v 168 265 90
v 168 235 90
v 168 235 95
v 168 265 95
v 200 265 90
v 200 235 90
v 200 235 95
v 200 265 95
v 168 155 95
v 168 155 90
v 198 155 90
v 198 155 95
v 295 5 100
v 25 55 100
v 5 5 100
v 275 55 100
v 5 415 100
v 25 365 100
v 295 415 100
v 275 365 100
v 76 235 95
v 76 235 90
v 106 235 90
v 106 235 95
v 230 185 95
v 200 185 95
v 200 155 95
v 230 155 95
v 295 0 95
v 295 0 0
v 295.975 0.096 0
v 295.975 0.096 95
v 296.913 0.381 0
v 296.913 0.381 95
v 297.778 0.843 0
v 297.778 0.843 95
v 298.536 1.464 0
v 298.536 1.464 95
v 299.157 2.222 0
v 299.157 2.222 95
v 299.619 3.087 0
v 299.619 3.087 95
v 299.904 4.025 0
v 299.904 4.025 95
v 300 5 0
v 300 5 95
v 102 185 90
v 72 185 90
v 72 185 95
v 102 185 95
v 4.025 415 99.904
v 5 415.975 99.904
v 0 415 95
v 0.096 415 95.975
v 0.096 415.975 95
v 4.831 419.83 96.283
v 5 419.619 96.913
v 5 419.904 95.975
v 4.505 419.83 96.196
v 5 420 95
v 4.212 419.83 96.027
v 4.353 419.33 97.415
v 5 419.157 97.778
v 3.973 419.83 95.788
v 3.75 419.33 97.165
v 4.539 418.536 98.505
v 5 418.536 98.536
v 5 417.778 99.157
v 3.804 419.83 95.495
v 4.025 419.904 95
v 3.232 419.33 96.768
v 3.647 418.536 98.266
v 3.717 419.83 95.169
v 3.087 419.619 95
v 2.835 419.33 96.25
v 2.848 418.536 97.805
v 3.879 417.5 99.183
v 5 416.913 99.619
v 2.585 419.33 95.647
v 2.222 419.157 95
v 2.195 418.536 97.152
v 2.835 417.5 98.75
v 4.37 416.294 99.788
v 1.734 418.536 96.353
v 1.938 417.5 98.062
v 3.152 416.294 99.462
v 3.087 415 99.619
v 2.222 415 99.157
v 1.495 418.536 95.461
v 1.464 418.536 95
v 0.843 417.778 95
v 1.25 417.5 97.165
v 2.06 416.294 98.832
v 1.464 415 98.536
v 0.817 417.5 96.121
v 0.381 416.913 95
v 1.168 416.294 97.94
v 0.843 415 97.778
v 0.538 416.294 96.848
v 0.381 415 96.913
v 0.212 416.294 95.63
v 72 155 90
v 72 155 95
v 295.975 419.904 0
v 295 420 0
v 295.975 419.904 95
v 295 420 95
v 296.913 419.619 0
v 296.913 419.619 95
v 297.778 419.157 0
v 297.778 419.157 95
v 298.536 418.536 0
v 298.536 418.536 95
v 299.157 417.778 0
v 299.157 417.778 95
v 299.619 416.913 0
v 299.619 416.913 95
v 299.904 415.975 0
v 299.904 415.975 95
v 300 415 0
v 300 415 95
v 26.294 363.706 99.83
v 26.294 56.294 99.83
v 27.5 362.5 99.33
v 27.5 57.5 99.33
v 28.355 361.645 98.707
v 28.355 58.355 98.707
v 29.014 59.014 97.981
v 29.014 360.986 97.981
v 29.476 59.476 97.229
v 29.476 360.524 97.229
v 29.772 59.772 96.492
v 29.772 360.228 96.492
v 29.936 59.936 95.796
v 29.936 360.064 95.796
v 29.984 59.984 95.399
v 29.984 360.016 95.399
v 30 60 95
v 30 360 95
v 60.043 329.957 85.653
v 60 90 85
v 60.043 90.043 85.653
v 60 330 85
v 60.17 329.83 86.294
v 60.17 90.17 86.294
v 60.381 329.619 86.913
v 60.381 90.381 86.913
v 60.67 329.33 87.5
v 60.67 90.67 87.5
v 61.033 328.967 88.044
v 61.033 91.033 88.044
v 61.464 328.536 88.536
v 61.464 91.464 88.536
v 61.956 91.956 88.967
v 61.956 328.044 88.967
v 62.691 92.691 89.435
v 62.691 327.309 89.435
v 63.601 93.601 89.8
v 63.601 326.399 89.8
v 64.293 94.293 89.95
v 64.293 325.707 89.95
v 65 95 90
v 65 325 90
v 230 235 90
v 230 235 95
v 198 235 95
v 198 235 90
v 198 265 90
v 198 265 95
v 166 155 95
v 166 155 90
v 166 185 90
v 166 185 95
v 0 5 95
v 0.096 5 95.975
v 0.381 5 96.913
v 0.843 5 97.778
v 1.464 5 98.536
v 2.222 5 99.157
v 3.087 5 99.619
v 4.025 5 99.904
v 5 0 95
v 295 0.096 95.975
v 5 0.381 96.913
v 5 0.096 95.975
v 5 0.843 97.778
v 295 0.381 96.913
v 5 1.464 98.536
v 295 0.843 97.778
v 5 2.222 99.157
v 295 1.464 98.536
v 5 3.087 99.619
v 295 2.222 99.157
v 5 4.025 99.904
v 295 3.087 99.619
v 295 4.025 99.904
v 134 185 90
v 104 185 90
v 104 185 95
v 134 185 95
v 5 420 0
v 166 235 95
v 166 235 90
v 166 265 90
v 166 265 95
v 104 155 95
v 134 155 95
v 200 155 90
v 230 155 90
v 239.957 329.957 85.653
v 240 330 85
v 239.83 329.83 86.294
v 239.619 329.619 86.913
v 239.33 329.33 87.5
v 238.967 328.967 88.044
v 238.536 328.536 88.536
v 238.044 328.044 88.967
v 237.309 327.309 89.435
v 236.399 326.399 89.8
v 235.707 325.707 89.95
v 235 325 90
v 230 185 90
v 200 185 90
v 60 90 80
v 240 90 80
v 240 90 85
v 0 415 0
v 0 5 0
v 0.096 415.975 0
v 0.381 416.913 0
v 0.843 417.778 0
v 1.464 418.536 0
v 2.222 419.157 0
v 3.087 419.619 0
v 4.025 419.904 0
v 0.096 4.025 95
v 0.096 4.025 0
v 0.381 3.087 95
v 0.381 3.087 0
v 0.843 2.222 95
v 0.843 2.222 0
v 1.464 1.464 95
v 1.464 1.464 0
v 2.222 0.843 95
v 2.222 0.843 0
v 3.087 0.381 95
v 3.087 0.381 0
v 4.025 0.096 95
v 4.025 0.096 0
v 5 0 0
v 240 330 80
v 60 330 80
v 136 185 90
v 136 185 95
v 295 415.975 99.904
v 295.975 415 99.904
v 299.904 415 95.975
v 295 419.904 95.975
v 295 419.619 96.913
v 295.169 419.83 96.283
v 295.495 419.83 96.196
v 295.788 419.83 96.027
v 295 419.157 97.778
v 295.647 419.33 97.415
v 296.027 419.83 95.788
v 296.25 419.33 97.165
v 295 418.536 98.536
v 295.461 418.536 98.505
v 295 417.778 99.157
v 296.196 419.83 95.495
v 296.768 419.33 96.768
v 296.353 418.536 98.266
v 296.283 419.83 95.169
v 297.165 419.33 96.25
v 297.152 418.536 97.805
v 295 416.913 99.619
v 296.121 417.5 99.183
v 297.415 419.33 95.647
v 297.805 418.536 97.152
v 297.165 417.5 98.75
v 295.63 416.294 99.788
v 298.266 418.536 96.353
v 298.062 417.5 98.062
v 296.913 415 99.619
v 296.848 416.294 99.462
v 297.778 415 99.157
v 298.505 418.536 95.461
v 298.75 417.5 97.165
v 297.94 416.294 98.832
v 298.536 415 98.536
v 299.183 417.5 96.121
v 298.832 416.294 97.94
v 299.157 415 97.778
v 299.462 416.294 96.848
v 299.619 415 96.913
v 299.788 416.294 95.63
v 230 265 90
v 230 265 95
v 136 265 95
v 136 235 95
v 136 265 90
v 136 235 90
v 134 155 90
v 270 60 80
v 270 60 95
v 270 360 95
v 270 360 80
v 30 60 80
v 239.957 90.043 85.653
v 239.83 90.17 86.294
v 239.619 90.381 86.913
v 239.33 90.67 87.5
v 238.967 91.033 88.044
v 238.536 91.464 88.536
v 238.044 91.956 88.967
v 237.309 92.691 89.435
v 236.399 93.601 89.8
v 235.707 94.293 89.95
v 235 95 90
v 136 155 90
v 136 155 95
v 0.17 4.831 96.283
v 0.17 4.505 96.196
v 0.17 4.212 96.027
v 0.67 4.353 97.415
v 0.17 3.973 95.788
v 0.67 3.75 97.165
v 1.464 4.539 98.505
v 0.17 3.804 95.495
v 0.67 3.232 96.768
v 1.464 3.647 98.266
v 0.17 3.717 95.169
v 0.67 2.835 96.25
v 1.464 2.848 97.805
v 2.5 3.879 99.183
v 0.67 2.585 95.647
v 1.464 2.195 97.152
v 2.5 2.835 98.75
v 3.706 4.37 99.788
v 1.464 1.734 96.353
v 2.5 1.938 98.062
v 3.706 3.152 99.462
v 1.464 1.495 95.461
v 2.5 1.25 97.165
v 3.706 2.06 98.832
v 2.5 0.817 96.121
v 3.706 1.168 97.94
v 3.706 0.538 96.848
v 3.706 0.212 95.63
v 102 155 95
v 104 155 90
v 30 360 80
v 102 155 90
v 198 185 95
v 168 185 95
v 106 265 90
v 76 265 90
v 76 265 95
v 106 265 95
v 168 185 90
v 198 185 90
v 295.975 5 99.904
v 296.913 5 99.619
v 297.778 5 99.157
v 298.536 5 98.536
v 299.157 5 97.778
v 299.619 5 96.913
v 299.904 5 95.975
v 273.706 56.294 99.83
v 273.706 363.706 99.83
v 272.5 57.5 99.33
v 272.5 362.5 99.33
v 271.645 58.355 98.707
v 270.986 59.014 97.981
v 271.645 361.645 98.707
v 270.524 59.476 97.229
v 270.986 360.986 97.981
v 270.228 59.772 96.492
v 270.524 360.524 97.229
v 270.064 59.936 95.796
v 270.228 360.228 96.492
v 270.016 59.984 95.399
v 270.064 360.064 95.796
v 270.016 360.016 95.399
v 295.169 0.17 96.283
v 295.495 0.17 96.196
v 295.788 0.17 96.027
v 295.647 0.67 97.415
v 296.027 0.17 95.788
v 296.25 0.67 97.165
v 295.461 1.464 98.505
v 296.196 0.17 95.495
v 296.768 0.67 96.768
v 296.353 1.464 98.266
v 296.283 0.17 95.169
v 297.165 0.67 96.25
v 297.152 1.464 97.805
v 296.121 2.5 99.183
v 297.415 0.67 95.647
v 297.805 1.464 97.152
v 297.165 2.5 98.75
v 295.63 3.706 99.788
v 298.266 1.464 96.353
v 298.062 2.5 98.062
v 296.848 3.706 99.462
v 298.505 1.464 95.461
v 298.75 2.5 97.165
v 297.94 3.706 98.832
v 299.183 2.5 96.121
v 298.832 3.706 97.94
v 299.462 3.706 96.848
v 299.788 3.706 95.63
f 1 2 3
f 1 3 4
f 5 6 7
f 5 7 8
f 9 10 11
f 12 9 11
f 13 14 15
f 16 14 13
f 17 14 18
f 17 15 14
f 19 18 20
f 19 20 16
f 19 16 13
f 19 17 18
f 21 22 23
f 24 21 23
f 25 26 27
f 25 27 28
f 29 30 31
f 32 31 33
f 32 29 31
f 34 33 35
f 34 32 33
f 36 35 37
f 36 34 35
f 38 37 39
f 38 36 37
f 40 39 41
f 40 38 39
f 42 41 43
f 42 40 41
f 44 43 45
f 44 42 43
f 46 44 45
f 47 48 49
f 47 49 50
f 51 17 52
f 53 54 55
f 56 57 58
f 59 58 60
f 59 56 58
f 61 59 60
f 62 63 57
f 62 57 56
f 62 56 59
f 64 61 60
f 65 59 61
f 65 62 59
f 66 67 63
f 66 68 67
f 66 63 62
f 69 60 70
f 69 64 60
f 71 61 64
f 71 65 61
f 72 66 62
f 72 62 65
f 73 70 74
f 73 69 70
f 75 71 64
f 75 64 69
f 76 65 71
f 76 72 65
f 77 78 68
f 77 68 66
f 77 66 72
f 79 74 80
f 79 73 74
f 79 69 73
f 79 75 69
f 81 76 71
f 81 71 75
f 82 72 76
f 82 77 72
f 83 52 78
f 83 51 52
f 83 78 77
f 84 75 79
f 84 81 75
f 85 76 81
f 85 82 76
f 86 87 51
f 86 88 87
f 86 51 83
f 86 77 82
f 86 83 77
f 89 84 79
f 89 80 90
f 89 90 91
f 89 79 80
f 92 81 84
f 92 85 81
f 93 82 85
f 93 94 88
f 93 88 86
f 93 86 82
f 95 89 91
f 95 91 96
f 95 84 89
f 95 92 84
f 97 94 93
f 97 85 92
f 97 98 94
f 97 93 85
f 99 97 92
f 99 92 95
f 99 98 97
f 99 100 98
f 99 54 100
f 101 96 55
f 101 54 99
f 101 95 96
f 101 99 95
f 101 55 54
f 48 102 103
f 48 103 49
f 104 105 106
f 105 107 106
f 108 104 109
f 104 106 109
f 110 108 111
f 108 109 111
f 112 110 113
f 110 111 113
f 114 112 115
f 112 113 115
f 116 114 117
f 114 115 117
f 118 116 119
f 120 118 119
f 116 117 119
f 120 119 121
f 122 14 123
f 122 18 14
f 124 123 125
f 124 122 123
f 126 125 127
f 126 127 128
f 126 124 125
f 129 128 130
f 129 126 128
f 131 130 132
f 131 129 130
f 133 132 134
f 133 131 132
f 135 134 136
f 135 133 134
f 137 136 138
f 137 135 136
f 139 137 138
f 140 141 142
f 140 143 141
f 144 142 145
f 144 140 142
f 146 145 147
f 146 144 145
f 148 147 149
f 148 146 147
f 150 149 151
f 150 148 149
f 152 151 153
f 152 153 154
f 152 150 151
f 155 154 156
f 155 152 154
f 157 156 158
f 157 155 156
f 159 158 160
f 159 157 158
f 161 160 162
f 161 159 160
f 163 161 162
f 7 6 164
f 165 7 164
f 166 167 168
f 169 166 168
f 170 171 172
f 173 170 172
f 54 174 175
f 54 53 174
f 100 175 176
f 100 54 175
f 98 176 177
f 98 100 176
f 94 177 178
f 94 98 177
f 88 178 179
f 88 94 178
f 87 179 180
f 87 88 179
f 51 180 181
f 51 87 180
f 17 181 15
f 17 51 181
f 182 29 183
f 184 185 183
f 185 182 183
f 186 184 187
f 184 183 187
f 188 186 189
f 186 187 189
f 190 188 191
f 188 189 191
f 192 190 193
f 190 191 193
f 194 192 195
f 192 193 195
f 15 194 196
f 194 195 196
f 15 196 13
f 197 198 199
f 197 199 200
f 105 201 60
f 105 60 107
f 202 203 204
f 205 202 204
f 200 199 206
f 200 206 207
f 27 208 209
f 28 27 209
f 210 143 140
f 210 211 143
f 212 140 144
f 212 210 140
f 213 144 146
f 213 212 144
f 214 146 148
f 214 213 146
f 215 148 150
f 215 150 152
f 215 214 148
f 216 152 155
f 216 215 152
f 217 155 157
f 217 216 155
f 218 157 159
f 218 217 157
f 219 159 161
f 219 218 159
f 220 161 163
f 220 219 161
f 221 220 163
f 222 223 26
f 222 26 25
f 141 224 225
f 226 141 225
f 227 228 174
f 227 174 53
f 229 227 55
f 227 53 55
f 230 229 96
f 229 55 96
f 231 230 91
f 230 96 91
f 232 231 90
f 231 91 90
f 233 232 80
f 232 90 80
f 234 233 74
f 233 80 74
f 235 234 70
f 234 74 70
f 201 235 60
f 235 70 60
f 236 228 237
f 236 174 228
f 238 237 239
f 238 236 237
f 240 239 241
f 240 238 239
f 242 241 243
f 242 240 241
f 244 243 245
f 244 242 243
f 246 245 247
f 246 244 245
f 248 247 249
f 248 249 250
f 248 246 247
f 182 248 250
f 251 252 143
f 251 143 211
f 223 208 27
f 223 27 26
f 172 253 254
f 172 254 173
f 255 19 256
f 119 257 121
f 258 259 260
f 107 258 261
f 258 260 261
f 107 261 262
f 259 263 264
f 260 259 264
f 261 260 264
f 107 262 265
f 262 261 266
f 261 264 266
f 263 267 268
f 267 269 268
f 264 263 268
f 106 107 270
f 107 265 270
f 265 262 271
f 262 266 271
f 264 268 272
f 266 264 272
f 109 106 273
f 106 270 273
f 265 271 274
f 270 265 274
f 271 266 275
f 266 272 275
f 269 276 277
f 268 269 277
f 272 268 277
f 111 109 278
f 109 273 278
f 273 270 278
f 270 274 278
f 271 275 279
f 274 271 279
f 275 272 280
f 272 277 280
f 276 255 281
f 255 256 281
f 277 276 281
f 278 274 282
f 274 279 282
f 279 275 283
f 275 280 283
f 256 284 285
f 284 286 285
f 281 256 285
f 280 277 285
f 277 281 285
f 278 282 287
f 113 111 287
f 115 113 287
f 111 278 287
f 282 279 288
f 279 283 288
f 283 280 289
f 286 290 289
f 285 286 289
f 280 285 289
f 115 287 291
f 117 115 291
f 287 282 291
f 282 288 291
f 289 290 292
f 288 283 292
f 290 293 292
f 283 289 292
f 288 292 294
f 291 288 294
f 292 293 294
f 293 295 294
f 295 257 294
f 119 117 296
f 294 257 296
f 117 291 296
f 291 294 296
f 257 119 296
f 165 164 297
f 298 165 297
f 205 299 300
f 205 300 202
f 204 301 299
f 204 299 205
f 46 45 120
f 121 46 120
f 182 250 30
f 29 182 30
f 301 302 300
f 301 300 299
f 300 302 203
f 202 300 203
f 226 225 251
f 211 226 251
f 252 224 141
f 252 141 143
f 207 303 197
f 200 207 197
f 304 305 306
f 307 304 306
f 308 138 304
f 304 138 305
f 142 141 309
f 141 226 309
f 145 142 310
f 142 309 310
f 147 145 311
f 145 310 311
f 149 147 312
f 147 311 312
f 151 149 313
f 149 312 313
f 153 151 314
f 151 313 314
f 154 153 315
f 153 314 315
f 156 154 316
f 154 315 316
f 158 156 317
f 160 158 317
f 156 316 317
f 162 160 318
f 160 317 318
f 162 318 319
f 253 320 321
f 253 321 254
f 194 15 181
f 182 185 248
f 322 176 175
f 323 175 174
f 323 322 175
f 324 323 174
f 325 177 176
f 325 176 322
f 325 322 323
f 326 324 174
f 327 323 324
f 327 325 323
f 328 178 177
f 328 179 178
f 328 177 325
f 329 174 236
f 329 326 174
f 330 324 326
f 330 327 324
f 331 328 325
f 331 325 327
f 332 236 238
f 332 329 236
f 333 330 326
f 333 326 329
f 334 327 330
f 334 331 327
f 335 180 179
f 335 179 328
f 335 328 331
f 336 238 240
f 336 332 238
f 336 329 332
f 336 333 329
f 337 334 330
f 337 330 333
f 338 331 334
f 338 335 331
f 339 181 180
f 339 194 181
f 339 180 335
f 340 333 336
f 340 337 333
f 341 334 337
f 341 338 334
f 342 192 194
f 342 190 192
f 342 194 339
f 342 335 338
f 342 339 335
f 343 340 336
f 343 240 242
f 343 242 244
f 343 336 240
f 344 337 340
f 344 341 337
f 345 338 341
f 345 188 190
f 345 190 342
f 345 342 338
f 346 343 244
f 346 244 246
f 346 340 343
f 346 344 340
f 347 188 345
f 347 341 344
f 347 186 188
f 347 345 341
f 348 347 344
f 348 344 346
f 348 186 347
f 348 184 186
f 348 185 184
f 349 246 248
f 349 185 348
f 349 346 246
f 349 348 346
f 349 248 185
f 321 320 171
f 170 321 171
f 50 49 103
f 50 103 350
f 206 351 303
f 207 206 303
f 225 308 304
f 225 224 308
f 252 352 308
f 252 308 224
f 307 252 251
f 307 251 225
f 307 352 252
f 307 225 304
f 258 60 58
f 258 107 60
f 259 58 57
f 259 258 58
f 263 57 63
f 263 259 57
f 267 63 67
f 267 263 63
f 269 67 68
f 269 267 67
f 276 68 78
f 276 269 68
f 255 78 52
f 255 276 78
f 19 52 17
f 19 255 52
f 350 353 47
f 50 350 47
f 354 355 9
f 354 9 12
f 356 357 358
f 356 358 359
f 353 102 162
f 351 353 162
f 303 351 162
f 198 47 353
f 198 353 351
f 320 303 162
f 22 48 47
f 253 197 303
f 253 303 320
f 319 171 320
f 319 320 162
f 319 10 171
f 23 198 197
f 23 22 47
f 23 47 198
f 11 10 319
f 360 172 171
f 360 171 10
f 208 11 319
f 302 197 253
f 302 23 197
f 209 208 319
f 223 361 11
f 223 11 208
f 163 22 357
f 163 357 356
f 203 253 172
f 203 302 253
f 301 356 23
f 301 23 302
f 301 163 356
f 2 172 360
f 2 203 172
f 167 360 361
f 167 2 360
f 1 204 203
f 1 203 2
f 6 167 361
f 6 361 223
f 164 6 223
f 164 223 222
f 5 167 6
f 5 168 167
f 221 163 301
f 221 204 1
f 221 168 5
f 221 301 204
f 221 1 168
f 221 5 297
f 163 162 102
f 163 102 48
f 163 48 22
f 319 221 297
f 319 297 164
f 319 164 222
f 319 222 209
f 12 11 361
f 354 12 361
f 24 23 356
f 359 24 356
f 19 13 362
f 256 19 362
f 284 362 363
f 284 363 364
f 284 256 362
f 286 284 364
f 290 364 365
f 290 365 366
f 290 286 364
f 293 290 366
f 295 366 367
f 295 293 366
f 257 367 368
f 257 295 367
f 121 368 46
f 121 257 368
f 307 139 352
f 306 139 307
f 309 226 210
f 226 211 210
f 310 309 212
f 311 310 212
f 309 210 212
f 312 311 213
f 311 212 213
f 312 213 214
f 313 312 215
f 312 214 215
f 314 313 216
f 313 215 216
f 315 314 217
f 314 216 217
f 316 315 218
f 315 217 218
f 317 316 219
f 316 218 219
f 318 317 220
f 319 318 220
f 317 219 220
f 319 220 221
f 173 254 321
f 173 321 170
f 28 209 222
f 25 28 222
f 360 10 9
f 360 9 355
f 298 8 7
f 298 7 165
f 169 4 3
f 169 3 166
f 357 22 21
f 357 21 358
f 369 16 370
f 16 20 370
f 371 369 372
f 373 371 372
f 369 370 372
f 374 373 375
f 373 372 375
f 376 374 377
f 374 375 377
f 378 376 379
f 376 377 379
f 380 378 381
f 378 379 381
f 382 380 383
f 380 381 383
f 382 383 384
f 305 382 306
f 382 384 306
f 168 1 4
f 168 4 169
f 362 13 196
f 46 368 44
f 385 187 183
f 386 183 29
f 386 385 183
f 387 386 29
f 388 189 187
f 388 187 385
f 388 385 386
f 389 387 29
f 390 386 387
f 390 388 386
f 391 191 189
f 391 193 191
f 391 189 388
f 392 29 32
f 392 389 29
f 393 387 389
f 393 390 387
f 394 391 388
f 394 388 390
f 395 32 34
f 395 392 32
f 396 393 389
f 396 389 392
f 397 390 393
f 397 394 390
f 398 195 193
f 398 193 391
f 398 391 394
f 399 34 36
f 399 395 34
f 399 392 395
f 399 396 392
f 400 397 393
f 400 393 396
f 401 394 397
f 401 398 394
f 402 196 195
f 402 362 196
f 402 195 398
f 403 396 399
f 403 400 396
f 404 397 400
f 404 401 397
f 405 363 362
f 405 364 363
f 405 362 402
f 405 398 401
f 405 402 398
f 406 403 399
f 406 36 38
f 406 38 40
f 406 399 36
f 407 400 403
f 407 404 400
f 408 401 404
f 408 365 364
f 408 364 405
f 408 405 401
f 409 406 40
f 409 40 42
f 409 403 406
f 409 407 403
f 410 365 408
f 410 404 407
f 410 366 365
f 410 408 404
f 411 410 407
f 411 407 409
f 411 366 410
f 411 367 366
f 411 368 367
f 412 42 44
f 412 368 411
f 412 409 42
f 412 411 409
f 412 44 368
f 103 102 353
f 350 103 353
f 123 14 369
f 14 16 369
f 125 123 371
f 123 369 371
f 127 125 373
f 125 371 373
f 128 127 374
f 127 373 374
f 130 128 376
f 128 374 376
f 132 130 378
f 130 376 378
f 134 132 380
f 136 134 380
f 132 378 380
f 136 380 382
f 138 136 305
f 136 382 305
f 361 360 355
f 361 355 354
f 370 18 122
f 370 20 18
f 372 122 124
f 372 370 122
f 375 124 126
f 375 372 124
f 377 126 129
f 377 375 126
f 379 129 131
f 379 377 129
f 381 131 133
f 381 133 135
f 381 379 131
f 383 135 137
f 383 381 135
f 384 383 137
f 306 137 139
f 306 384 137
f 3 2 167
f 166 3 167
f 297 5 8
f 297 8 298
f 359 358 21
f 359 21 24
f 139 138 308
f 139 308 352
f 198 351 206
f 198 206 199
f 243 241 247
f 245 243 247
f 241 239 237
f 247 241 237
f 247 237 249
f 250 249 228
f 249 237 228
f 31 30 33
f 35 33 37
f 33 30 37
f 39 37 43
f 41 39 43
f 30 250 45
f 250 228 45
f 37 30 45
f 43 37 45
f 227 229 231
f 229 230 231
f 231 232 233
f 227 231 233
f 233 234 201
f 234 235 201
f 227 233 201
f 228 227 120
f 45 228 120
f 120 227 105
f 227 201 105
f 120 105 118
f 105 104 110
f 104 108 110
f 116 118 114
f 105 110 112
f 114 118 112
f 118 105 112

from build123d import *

# Parameters (mm, degrees)
SKETCH1_W           = 300
SKETCH1_H           = 420
BOSS_EXTRUDE1_DEPTH = 100
SKETCH2_W           = 240
SKETCH2_H           = 300
CUT_EXTRUDE1_DEPTH  = 20
SKETCH3_W           = 180
SKETCH3_H           = 240
BOSS_EXTRUDE2_DEPTH = 10
SKETCH4_W           = 30
SKETCH4_H           = 30
BOSS_EXTRUDE3_DEPTH = 5
FILLET1_R           = 5
FILLET2_R           = 5


with BuildPart() as part:
    # Sketch1 → Boss-Extrude1 (new body)
    with BuildSketch(Plane.XY):
        with Locations((150, 210)):
            Rectangle(SKETCH1_W, SKETCH1_H)
    extrude(amount=BOSS_EXTRUDE1_DEPTH)

    # Sketch2 → Cut-Extrude1 (cut)
    with BuildSketch(Plane.XY.offset(100)):
        with Locations((150, 210)):
            Rectangle(SKETCH2_W, SKETCH2_H)
    extrude(amount=-CUT_EXTRUDE1_DEPTH, mode=Mode.SUBTRACT)

    # Sketch3 → Boss-Extrude2 (add)
    with BuildSketch(Plane.XY.offset(80)):
        with Locations((150, 210)):
            Rectangle(SKETCH3_W, SKETCH3_H)
    extrude(amount=BOSS_EXTRUDE2_DEPTH)

    # Sketch4 → Boss-Extrude3 (add)
    with BuildSketch(Plane.XY.offset(90)):
        with Locations((91, 250)):
            Rectangle(SKETCH4_W, SKETCH4_H)
        with Locations((151, 250)):
            Rectangle(SKETCH4_W, SKETCH4_H)
        with Locations((183, 250)):
            Rectangle(SKETCH4_W, SKETCH4_H)
        with Locations((215, 250)):
            Rectangle(SKETCH4_W, SKETCH4_H)
        with Locations((87, 170)):
            Rectangle(SKETCH4_W, SKETCH4_H)
        with Locations((119, 170)):
            Rectangle(SKETCH4_W, SKETCH4_H)
        with Locations((151, 170)):
            Rectangle(SKETCH4_W, SKETCH4_H)
        with Locations((183, 170)):
            Rectangle(SKETCH4_W, SKETCH4_H)
        with Locations((215, 170)):
            Rectangle(SKETCH4_W, SKETCH4_H)
    extrude(amount=BOSS_EXTRUDE3_DEPTH)

    # Fillet1
    fillet1_edges = [part.edges().sort_by_distance(p)[0] for p in [
        (300, 210, 100),
        (150, 0, 100),
        (30, 210, 100),
        (150, 60, 100),
        (270, 210, 100),
        (150, 360, 100),
        (0, 210, 100),
        (150, 420, 100),
        (0, 0, 50),
        (300, 0, 50),
        (300, 420, 50),
        (0, 420, 50),
    ]]
    fillet(fillet1_edges, radius=FILLET1_R)

    # Fillet2
    fillet2_edges = [part.edges().sort_by_distance(p)[0] for p in [
        (150, 330, 90),
        (60, 210, 90),
        (150, 90, 90),
        (240, 210, 90),
    ]]
    fillet(fillet2_edges, radius=FILLET2_R)


solid = part.part
